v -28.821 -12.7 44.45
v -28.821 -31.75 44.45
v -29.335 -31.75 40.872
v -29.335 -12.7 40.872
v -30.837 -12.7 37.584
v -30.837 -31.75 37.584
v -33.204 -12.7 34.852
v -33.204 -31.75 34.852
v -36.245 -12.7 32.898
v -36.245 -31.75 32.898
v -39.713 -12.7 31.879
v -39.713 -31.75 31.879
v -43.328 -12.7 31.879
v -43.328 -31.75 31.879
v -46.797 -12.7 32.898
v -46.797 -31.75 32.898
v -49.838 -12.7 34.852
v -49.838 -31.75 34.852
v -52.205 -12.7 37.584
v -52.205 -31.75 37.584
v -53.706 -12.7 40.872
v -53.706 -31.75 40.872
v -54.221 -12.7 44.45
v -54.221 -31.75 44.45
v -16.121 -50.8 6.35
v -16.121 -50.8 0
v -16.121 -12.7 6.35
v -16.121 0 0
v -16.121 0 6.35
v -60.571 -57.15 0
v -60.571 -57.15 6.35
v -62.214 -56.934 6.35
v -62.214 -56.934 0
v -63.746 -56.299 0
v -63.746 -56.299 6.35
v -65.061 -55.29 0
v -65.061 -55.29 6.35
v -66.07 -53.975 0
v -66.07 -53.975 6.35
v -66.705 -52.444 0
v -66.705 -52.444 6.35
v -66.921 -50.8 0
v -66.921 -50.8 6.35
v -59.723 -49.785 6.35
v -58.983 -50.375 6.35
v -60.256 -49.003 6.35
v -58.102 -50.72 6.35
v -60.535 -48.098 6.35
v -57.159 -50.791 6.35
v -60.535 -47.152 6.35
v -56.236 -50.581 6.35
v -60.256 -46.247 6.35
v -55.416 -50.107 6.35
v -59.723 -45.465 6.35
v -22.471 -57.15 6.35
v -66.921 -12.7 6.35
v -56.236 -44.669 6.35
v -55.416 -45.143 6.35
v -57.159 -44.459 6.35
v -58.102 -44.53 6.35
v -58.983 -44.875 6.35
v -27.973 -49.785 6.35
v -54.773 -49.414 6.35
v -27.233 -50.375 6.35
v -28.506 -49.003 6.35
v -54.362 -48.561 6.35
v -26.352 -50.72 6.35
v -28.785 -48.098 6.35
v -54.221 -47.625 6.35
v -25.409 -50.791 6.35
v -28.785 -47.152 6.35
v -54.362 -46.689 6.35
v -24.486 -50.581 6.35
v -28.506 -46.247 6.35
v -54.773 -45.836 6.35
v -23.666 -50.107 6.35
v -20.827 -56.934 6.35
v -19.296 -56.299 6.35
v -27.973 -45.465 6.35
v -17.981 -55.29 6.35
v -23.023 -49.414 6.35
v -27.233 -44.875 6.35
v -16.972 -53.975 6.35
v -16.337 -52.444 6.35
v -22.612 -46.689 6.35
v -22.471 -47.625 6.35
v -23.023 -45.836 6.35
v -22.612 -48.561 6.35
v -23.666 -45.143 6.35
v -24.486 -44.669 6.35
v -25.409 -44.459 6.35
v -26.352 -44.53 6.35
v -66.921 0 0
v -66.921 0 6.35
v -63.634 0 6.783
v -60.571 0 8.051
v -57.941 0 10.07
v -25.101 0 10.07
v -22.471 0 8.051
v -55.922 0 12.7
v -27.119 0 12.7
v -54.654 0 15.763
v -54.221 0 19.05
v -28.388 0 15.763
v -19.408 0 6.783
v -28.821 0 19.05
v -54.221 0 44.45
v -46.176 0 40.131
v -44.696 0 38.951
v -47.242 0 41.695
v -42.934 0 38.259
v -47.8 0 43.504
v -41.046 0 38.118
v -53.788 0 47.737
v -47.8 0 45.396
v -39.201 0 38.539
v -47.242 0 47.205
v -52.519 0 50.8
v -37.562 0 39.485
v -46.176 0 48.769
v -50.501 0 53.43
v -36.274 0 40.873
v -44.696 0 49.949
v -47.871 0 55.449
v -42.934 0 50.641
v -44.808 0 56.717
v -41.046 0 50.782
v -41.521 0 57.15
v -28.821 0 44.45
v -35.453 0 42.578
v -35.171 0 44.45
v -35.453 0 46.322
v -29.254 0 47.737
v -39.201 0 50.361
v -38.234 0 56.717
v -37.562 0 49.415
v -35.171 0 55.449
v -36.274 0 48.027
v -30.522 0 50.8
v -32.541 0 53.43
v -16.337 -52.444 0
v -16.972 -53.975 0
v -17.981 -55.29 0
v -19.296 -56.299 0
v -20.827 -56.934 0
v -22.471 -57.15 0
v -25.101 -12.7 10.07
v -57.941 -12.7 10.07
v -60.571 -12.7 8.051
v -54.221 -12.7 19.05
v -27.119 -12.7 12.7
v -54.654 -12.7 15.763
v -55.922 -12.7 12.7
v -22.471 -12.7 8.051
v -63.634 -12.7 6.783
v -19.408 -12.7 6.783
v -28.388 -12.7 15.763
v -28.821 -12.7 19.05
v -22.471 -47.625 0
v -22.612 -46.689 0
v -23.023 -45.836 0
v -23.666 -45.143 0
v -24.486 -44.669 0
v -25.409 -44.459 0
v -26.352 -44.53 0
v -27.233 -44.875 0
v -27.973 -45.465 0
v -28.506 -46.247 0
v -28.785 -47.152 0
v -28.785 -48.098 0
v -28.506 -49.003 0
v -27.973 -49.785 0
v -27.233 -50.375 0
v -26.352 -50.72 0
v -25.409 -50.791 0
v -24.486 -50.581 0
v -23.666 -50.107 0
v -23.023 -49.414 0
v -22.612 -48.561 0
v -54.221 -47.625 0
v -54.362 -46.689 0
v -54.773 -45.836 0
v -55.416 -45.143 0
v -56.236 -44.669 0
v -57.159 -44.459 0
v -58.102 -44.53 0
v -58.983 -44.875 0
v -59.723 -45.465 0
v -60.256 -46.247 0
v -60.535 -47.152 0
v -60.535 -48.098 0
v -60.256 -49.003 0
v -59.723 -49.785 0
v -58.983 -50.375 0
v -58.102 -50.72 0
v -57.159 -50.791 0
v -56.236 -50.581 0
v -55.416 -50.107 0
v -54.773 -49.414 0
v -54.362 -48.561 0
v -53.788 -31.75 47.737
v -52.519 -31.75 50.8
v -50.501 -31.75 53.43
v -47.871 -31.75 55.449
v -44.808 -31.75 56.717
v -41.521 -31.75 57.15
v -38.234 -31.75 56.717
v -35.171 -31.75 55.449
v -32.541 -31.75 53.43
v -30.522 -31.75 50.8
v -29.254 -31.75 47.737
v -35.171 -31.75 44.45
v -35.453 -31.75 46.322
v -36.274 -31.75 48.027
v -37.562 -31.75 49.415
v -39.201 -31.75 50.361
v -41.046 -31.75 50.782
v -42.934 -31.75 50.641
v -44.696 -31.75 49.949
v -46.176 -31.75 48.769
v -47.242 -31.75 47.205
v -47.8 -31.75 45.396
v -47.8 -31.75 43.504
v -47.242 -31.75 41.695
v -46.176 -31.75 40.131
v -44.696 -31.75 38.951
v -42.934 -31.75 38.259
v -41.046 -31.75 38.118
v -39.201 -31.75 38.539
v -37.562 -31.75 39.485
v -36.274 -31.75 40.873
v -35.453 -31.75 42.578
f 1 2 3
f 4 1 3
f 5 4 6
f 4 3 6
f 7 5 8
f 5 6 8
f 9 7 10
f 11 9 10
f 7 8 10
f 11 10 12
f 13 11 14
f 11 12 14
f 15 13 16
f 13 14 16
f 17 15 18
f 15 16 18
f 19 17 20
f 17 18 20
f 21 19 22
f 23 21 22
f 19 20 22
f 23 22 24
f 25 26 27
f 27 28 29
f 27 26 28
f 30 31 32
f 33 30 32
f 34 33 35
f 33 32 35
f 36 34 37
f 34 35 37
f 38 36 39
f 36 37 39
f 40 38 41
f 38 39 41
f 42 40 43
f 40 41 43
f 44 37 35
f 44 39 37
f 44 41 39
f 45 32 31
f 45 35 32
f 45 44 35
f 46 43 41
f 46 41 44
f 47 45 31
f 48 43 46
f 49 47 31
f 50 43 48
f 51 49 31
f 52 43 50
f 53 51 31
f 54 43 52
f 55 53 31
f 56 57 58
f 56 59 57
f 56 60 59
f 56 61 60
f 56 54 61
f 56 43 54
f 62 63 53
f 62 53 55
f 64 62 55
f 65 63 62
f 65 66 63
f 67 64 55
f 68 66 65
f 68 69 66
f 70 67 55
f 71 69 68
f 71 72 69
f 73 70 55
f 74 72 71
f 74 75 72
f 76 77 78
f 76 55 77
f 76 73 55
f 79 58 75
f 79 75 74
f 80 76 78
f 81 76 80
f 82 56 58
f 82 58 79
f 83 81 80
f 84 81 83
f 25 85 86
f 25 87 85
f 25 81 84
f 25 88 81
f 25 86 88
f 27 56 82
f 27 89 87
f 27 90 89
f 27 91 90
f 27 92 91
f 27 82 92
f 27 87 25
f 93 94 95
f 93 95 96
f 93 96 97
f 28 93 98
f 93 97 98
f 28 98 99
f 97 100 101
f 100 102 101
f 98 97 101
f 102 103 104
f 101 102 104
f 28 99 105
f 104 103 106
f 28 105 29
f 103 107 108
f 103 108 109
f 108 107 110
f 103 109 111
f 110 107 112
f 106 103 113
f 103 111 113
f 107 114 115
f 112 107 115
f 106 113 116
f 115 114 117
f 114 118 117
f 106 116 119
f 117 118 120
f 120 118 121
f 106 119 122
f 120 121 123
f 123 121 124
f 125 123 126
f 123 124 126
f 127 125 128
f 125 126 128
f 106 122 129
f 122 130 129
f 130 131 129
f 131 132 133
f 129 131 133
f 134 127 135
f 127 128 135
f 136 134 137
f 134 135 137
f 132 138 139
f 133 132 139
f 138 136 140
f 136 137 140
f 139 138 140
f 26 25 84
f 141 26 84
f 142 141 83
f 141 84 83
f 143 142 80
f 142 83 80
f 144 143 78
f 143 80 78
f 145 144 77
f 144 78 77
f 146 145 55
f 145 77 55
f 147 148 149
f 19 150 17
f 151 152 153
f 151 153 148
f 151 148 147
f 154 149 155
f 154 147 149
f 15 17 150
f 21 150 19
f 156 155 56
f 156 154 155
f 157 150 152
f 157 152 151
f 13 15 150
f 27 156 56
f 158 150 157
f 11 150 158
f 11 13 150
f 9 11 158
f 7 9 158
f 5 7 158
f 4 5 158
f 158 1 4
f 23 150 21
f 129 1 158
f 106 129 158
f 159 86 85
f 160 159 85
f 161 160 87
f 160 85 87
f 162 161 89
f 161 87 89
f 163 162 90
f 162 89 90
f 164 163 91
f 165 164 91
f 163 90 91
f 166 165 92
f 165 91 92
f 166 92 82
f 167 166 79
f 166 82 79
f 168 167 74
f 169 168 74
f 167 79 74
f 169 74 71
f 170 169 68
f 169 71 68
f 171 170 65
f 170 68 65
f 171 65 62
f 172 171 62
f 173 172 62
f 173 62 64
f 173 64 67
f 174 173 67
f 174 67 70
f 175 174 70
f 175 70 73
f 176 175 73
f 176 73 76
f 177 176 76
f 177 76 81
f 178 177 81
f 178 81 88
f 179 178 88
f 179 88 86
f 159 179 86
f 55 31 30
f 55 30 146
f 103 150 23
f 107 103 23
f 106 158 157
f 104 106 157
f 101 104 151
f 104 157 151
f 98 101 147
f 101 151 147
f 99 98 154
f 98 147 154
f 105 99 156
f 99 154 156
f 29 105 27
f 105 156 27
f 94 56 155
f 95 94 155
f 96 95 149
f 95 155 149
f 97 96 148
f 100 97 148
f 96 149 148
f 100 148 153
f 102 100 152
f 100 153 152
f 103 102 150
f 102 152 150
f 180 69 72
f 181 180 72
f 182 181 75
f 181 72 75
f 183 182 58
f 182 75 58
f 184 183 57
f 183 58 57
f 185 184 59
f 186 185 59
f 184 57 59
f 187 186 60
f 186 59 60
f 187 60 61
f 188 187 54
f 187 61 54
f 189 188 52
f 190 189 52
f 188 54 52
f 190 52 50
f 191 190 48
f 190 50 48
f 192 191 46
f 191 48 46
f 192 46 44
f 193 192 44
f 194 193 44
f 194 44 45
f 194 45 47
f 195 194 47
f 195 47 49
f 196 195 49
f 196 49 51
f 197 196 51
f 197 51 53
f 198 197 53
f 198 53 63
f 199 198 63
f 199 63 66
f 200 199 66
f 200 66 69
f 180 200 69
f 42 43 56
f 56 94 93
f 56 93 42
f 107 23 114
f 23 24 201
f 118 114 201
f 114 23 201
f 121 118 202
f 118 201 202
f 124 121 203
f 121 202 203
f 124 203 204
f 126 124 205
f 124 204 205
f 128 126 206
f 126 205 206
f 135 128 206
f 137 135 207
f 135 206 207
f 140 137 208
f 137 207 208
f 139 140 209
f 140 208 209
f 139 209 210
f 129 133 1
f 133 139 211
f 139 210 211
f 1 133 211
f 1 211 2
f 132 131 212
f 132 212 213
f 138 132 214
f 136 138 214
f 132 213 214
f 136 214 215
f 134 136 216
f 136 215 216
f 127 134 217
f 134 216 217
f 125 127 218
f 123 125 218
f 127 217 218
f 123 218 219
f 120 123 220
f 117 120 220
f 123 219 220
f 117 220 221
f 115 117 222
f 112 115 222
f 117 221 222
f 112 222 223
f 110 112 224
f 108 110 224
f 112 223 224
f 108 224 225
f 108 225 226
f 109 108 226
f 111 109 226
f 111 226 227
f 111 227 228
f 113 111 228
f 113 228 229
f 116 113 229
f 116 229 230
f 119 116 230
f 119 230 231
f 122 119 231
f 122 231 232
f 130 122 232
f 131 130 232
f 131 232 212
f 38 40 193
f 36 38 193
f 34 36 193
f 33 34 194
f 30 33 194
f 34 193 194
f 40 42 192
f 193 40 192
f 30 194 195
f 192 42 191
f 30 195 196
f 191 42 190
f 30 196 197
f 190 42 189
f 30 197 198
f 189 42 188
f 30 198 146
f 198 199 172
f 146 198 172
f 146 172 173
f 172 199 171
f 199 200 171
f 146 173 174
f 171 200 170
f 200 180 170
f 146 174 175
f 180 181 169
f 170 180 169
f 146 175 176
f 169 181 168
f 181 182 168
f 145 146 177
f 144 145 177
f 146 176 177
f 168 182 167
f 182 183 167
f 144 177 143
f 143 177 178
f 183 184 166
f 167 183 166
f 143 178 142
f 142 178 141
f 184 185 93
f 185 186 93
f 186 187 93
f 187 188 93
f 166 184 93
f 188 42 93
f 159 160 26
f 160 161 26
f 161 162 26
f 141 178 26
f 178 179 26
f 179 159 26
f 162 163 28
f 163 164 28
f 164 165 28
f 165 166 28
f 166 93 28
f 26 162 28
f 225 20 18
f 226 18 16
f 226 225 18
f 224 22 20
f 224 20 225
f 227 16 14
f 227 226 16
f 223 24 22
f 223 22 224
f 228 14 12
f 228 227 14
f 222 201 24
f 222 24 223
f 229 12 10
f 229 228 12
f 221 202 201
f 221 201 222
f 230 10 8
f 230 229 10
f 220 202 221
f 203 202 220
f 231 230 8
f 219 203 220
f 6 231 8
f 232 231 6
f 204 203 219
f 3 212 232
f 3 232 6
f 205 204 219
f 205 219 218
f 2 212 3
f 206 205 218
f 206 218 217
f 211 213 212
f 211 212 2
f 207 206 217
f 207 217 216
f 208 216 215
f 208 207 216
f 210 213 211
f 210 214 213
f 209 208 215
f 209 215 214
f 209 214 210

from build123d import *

# Parameters (mm, degrees)
F0_W      = 27.6003498584
F0_H      = 50.8
F0_W_2    = 8.7740728214
F0_W_3    = 14.4255773202
F1_DEPTH  = 31.75
F2_W      = 12.7
F2_H      = 12.7
F3_DEPTH  = 31.751
F4_R      = 6.35
F5_DEPTH  = 31.751
F4_R_2    = 12.7
F6_DEPTH  = 12.7
F8_DEPTH  = 31.751
F10_DEPTH = 19.05
F11_DEPTH = 25.4
F13_DEPTH = 6.351
F14_R     = 3.175
F15_DEPTH = 6.351


with BuildPart() as f1:
    # F0 (on Front) → F1 (new body)
    with BuildSketch(Plane.XZ):
        with Locations((-44.346629642, 31.75)):
            Rectangle(F0_W, F0_H)
        with Locations((-62.5338409818, 31.75)):
            Rectangle(F0_W_2, F0_H)
        with Locations((-23.3336660526, 31.75)):
            Rectangle(F0_W_3, F0_H)
        Polygon((-58.1468045712, 6.35), (-66.9208773925, 6.35), (-66.9208773925, 0), (-16.1208773925, 0), (-16.1208773925, 6.35), (-30.5464547127, 6.35), align=None)
    extrude(amount=F1_DEPTH)

    # F2 (on face) → F3 (cut, through all)
    with BuildSketch(Plane.XZ.offset(31.75)):
        with Locations((-60.5708773925, 50.8)):
            Rectangle(F2_W, F2_H)
        with BuildLine():
            Line((-54.2208773925, 57.15), (-54.2208773925, 44.45))
            ThreePointArc((-54.2208773925, 44.45), (-50.5011335136, 53.4302561211), (-41.5208773925, 57.15))
            Line((-41.5208773925, 57.15), (-54.2208773925, 57.15))
        make_face()
        with BuildLine():
            ThreePointArc((-41.5208773925, 57.15), (-32.5406212715, 53.4302561211), (-28.8208773925, 44.45))
            Line((-28.8208773925, 44.45), (-28.8208773925, 57.15))
            Line((-28.8208773925, 57.15), (-41.5208773925, 57.15))
        make_face()
        with Locations((-22.4708773925, 50.8)):
            Rectangle(F2_W, F2_H)
    extrude(amount=-F3_DEPTH, mode=Mode.SUBTRACT)

    # F4 (on face) → F5 (cut, through all)
    with BuildSketch(Plane.XZ.offset(31.75)):
        with Locations((-41.5208773925, 44.45)):
            Circle(F4_R)
    extrude(amount=-F5_DEPTH, mode=Mode.SUBTRACT)

    # F4 (on face) → F6 (cut)
    with BuildSketch(Plane.XZ.offset(31.75)):
        with Locations((-41.5208773925, 44.45)):
            Circle(F4_R_2)
        with Locations((-41.5208773925, 44.45)):
            Circle(F4_R, mode=Mode.SUBTRACT)
    extrude(amount=F6_DEPTH, mode=Mode.SUBTRACT)

    # F7 (on face) → F8 (cut, through all)
    with BuildSketch(Plane.XZ.offset(31.75)):
        with BuildLine():
            Line((-66.9208773925, 44.45), (-66.9208773925, 6.35))
            ThreePointArc((-66.9208773925, 6.35), (-57.9406212715, 10.0697438789), (-54.2208773925, 19.05))
            Line((-54.2208773925, 19.05), (-54.2208773925, 44.45))
            Line((-54.2208773925, 44.45), (-66.9208773925, 44.45))
        make_face()
        with BuildLine():
            ThreePointArc((-28.8208773925, 19.05), (-25.1011335136, 10.0697438789), (-16.1208773925, 6.35))
            Line((-16.1208773925, 6.35), (-16.1208773925, 44.45))
            Line((-16.1208773925, 44.45), (-28.8208773925, 44.45))
            Line((-28.8208773925, 44.45), (-28.8208773925, 19.05))
        make_face()
    extrude(amount=-F8_DEPTH, mode=Mode.SUBTRACT)

    # F9 (on face) → F10 (cut)
    with BuildSketch(Plane.XZ.offset(31.75)):
        with BuildLine():
            ThreePointArc((-54.2208773925, 19.05), (-57.9406212715, 10.0697438789), (-66.9208773925, 6.35))
            Line((-66.9208773925, 6.35), (-16.1208773925, 6.35))
            ThreePointArc((-16.1208773925, 6.35), (-25.1011335136, 10.0697438789), (-28.8208773925, 19.05))
            Line((-28.8208773925, 19.05), (-28.8208773925, 44.45))
            ThreePointArc((-28.8208773925, 44.45), (-41.5208773925, 31.75), (-54.2208773925, 44.45))
            Line((-54.2208773925, 44.45), (-54.2208773925, 19.05))
        make_face()
    extrude(amount=-F10_DEPTH, mode=Mode.SUBTRACT)

    # F11 (add): a face of the model
    f11_faces = [f1.faces().sort_by_distance(p)[0] for p in [
        (-41.5208773925, -31.75, 3.175),
    ]]
    extrude(f11_faces, amount=F11_DEPTH)

    # F12 (on face) → F13 (cut, through all)
    with BuildSketch(Plane.XY.offset(6.35)):
        with BuildLine():
            Line((-66.9208773925, -50.8), (-66.9208773925, -57.15))
            Line((-66.9208773925, -57.15), (-60.5708773925, -57.15))
            ThreePointArc((-60.5708773925, -57.15), (-65.0610054531, -55.2901280605), (-66.9208773925, -50.8))
        make_face()
        with BuildLine():
            ThreePointArc((-16.1208773925, -50.8), (-17.980749332, -55.2901280605), (-22.4708773925, -57.15))
            Line((-22.4708773925, -57.15), (-16.1208773925, -57.15))
            Line((-16.1208773925, -57.15), (-16.1208773925, -50.8))
        make_face()
    extrude(amount=-F13_DEPTH, mode=Mode.SUBTRACT)

    # F14 (on face) → F15 (cut, through all)
    with BuildSketch(Plane.XY.offset(6.35)):
        with Locations((-57.3958773925, -47.625)):
            Circle(F14_R)
        with Locations((-25.6458773925, -47.625)):
            Circle(F14_R)
    extrude(amount=-F15_DEPTH, mode=Mode.SUBTRACT)


solid = f1.part
